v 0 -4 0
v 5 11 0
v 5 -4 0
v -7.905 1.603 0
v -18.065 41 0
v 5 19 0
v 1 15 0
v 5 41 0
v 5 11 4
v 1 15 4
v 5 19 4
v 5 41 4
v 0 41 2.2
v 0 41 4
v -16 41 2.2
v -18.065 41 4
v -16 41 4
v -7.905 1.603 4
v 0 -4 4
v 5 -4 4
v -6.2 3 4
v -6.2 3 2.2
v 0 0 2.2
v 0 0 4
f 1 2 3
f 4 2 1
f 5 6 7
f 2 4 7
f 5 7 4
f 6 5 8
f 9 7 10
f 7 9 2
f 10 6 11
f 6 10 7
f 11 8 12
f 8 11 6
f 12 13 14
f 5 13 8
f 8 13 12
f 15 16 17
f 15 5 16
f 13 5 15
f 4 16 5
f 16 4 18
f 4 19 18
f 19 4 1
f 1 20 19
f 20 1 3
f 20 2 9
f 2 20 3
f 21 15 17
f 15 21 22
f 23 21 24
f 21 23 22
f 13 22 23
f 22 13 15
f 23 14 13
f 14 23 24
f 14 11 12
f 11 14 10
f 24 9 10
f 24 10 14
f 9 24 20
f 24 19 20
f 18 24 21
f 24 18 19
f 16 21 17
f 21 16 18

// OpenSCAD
/*
 * Parametric OpenSCAD design for a caliper notched jaw cover.
 * Version: v0.03
 * Designed to exactly match the provided sketch with robust geometric handling.
 * Fixed: Robust handling of small jaw_tip_slant_height using vector-based offsets.
 */

/* [Version] */
version = "0.03";

/* [General Settings] */
// Which part to generate
part = "half"; // [both, half]

// --- Profile Data [length, thickness, base_width, tip_width, tip_height] ---
profile_kl2      = [32.0, 3.1, 14.0, 7.0, 1.0];
profile_bmrs     = [32.0, 3.5, 15.0, 9.0, 4.0];
profile_kalev    = [41.0, 3.6, 16.0, 6.2, 3.0];
profile_example  = [40.0, 3.5, 15.0, 8.0, 2.0];

/* [Caliper Profile Selection] */
profile = profile_kalev;

jaw_length           = profile[0];
jaw_thickness        = profile[1];
jaw_base_width       = profile[2];
jaw_tip_slant_width  = profile[3];
jaw_tip_slant_height = profile[4];

/* [Cover Dimensions] */
// Total thickness of the printed cover
cover_total_thickness = 8.0;
// Thickness of the plastic on the measuring (straight) face
wall_measuring_face = 5.0;
// Thickness of the plastic on the outer (slanted) faces (perpendicular thickness)
wall_outer_face = 2.0;
// Thickness of the plastic at the bottom tip
wall_tip = 4.0;

/* [Notch Dimensions] */
// Distance from the inner metal jaw tip to the center of the V-notch
notch_distance_from_tip = 15.0;
// Total vertical height of the V-notch opening
notch_height = 8.0;
// Depth of the V-notch into the plastic
notch_depth = 4.0;

// --- Implementation ---
$fn = 64;

// Calculate Z wall thickness to perfectly center the cavity
wall_z = (cover_total_thickness - jaw_thickness) / 2;

// --- Robust Math for Outer Walls ---
// We use vector math to avoid division by zero when angles are sharp
eps = 0.0001;
sh_safe = max(eps, jaw_tip_slant_height);

// Points of the metal jaw profile
p_jaw0 = [0, 0];
p_jaw1 = [-jaw_tip_slant_width, sh_safe];
p_jaw2 = [-jaw_base_width, jaw_length];

// Vectors of the segments
v01 = p_jaw1 - p_jaw0;
v12 = p_jaw2 - p_jaw1;

// Lengths
l01 = sqrt(v01[0]*v01[0] + v01[1]*v01[1]);
l12 = sqrt(v12[0]*v12[0] + v12[1]*v12[1]);

// Unit Normals (pointing left/outward)
n01 = [-v01[1]/l01, v01[0]/l01];
n12 = [-v12[1]/l12, v12[0]/l12];

// Intersection of offset segments 1 and 2
// Solve for intersection of Line 1 and Line 2
// Line 1: (p_jaw0 + wall_outer_face*n01) + t*v01
// Line 2: (p_jaw1 + wall_outer_face*n12) + u*v12
det = -v01[0]*v12[1] + v01[1]*v12[0];
t_int = (abs(det) < eps) ? 0 : (-(p_jaw1[0] - p_jaw0[0] + wall_outer_face*(n12[0] - n01[0]))*v12[1] + (p_jaw1[1] - p_jaw0[1] + wall_outer_face*(n12[1] - n01[1]))*v12[0]) / det;

p_int = (abs(det) < eps) ? (p_jaw1 + wall_outer_face*n01) : [ (p_jaw0[0] + wall_outer_face*n01[0]) + t_int*v01[0], (p_jaw0[1] + wall_outer_face*n01[1]) + t_int*v01[1] ];

x_int = p_int[0];
y_int = p_int[1];

// Function for X coordinates along the main offset wall
function outer_main_x(y) = (abs(v12[1]) < eps) ? (p_jaw2[0] + wall_outer_face*n12[0]) : (p_jaw2[0] + wall_outer_face*n12[0]) + ((y - (p_jaw2[1] + wall_outer_face*n12[1])) / v12[1]) * v12[0];

x_top_left = outer_main_x(jaw_length);

// Metal jaw width calculation
function get_jaw_width(y) = jaw_tip_slant_width + (jaw_base_width - jaw_tip_slant_width) * ((y - jaw_tip_slant_height) / max(eps, jaw_length - jaw_tip_slant_height));

module jaw_cover_2d_profile() {
    p_outer = [
        // Bottom Right
        [wall_measuring_face, -wall_tip],
        // Notch bottom
        [wall_measuring_face, notch_distance_from_tip - notch_height/2],
        // Notch inner point
        [wall_measuring_face - notch_depth, notch_distance_from_tip],
        // Notch top
        [wall_measuring_face, notch_distance_from_tip + notch_height/2],
        // Top right
        [wall_measuring_face, jaw_length],
        // Top left
        [x_top_left, jaw_length],
        // Miter Point (where outer cutback meets outer main slant)
        [x_int, y_int],
        // Bottom Mid (at axis)
        [0, -wall_tip]
    ];
    polygon(p_outer);
}

module cavity_2d_profile() {
    p_cavity = [
        [0, 0], // Bottom right "Tip"
        [-jaw_tip_slant_width, jaw_tip_slant_height], // Bottom left cutback point
        [-get_jaw_width(jaw_length + 1.0), jaw_length + 1.0], // Top left
        [0, jaw_length + 1.0] // Top right
    ];
    polygon(p_cavity);
}

module single_jaw_cover() {
    difference() {
        linear_extrude(height = cover_total_thickness)
            jaw_cover_2d_profile();
        translate([0, 0, wall_z])
            linear_extrude(height = jaw_thickness)
                cavity_2d_profile();
    }
}

// --- Render Logic ---
if (part == "both") {
    translate([-10, 0, 0]) single_jaw_cover();
    translate([10, 0, 0]) mirror([1, 0, 0]) single_jaw_cover();
} else if (part == "half") {
    // Render the bottom half of the cover
    intersection() {
        single_jaw_cover();
        translate([-50, -50, 0]) cube([100, 100, cover_total_thickness / 2]);
    }
}
